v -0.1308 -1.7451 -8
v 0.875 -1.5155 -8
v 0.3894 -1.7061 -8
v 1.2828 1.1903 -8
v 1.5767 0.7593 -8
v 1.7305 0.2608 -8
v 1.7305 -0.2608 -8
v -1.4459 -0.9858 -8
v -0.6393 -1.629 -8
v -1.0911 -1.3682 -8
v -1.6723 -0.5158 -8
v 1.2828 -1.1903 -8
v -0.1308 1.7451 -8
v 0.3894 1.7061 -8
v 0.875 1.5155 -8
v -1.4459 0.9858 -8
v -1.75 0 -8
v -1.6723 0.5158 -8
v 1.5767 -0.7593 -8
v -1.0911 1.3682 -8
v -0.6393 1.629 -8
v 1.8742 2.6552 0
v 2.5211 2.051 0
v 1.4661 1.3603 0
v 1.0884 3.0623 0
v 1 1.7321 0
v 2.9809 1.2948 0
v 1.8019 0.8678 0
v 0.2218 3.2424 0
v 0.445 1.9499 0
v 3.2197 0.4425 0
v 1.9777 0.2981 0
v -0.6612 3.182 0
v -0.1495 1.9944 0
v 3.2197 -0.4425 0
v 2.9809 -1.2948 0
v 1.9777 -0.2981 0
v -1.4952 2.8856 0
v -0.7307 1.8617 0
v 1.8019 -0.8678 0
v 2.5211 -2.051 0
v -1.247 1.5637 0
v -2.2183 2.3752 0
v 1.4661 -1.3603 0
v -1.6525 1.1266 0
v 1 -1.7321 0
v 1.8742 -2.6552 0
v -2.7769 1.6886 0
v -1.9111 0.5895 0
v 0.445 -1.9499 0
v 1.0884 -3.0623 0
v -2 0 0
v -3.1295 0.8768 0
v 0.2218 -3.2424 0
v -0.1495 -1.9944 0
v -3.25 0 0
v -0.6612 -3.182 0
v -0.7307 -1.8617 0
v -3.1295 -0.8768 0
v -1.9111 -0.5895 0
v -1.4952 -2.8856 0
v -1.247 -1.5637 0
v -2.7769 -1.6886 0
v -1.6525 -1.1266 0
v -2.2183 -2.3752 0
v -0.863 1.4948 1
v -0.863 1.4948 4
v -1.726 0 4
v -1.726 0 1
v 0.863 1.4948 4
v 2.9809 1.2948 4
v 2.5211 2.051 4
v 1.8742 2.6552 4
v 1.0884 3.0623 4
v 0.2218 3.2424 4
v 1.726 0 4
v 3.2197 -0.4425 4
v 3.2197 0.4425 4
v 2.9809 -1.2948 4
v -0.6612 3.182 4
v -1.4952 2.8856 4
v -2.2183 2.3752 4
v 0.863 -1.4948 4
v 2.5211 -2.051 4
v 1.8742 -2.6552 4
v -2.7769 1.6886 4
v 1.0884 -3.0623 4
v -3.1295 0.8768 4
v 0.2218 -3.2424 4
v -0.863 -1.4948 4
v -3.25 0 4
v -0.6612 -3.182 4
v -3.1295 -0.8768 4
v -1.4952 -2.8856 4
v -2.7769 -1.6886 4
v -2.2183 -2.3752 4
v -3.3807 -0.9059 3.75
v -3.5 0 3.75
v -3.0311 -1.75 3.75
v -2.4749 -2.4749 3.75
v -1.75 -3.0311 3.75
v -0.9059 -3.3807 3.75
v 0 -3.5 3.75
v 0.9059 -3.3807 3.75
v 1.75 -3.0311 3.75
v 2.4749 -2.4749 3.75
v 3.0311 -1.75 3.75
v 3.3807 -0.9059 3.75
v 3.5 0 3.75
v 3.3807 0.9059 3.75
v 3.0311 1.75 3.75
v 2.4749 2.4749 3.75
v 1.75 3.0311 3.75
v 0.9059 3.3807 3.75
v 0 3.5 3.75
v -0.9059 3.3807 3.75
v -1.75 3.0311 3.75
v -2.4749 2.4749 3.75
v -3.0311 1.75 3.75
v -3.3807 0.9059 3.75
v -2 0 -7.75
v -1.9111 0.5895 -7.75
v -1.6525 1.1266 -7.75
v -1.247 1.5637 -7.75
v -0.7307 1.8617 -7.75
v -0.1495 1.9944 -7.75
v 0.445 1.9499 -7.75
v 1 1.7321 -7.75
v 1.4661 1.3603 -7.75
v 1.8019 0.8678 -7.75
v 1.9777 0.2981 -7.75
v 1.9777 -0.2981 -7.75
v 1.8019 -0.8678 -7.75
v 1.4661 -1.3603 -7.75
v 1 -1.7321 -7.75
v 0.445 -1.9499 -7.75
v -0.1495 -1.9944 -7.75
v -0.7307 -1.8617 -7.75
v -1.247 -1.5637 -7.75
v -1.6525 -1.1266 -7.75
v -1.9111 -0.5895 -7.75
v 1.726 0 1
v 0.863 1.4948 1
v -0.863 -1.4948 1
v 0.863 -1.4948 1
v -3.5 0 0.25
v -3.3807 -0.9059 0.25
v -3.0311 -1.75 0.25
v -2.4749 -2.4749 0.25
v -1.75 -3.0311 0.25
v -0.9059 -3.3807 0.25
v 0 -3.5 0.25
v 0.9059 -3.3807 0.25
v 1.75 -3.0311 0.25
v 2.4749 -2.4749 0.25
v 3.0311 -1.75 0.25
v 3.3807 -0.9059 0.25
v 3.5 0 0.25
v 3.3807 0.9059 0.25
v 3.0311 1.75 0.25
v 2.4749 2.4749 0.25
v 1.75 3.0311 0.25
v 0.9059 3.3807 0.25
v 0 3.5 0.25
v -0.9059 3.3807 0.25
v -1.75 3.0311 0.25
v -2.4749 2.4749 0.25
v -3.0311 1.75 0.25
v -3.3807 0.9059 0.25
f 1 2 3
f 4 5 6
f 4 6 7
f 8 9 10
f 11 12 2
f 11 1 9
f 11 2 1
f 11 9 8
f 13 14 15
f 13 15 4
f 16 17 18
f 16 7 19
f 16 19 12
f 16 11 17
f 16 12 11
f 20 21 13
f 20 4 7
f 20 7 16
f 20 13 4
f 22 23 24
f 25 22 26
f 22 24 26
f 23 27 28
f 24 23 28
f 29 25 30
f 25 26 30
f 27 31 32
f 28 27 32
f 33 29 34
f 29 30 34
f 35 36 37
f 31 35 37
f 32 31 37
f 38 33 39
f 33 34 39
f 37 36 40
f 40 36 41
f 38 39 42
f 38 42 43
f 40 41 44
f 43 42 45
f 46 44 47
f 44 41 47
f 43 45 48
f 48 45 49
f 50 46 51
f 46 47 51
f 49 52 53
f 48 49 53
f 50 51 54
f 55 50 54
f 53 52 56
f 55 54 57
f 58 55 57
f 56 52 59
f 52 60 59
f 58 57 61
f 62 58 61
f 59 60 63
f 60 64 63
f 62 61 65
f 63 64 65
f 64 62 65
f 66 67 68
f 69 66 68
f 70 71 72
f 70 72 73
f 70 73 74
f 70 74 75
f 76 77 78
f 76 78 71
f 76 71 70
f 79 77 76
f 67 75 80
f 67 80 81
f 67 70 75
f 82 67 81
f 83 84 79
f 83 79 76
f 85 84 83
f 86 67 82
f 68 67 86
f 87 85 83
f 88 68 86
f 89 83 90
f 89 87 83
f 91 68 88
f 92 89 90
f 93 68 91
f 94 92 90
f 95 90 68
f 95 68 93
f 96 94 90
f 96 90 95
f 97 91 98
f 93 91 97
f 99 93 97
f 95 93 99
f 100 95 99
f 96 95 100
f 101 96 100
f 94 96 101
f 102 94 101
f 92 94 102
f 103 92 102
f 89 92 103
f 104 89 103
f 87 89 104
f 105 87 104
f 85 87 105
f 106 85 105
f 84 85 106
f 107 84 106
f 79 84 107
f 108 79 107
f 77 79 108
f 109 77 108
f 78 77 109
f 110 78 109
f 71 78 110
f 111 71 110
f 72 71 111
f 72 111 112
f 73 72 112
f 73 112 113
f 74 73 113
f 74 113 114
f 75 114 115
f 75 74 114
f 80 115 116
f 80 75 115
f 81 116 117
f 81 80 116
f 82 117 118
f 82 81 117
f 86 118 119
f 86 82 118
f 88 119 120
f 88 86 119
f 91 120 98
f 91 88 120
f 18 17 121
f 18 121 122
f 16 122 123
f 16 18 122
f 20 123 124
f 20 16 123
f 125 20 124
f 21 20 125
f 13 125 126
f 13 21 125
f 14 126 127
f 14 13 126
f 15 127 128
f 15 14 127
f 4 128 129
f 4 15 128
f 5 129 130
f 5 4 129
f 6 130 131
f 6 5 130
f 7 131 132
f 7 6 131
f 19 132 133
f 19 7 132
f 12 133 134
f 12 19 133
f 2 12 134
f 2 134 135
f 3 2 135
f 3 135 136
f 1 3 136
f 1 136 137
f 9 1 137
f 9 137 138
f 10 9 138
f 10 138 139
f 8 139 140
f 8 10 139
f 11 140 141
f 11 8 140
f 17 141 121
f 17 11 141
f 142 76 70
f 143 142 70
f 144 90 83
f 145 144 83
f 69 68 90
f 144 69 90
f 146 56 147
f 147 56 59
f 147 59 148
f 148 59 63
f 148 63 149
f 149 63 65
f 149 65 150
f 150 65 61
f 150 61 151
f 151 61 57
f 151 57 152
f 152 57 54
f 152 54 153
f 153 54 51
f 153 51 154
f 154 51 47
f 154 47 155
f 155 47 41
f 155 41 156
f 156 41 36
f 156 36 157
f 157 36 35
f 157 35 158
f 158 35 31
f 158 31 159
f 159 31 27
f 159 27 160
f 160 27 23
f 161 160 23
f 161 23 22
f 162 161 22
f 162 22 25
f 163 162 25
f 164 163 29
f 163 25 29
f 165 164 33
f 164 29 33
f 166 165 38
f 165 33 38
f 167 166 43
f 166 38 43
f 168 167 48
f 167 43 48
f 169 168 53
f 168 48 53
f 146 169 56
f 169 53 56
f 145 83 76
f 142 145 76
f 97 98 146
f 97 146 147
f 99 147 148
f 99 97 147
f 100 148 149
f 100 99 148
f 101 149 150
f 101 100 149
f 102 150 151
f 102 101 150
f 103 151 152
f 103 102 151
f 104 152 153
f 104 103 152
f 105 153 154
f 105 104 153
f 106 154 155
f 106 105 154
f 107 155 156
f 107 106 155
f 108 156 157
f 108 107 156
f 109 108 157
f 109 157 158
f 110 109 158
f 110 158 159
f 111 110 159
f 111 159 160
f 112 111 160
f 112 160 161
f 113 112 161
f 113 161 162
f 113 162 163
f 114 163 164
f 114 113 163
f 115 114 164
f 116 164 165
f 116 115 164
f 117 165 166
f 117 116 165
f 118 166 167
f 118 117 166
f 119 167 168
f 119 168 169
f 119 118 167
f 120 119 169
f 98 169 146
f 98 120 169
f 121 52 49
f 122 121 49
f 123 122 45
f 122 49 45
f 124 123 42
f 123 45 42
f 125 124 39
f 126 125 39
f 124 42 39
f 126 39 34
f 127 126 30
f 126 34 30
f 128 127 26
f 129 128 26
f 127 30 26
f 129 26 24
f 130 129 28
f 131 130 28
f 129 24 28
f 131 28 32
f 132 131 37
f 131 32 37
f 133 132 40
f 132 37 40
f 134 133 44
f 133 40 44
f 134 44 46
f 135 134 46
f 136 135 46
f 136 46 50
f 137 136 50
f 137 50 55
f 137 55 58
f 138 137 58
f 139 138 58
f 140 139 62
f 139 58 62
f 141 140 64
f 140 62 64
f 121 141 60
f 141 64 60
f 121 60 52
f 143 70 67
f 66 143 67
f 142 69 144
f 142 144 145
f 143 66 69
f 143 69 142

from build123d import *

# Parameters (mm, degrees)
SKETCH1_R           = 3.5
BOSS_EXTRUDE1_DEPTH = 4
SKETCH2_R           = 2
BOSS_EXTRUDE2_DEPTH = 8
CUT_EXTRUDE1_DEPTH  = 3
CHAMFER1_SIZE       = 0.25


with BuildPart() as part:
    # Sketch1 → Boss-Extrude1 (new body)
    with BuildSketch(Plane.XY.offset(4)):
        Circle(SKETCH1_R)
    extrude(amount=-BOSS_EXTRUDE1_DEPTH)

    # Sketch2 → Boss-Extrude2 (add)
    with BuildSketch(Plane(origin=(0, 0, 0), x_dir=(-1, 0, 0), z_dir=(0, 0, -1))):
        Circle(SKETCH2_R)
    extrude(amount=BOSS_EXTRUDE2_DEPTH)

    # Sketch3 → Cut-Extrude1 (cut)
    with BuildSketch(Plane.XY.offset(4)):
        Polygon((-1.726010921, 0), (-0.863005461, -1.494769305), (0.863005461, -1.494769305), (1.726010921, 0), (0.863005461, 1.494769305), (-0.863005461, 1.494769305), align=None)
    extrude(amount=-CUT_EXTRUDE1_DEPTH, mode=Mode.SUBTRACT)

    # Chamfer1
    chamfer1_edges = [part.edges().sort_by_distance(p)[0] for p in [
        (-3.5, 0, 4),
        (2, 0, -8),
        (-3.5, 0, 0),
    ]]
    chamfer(chamfer1_edges, length=CHAMFER1_SIZE)


solid = part.part
